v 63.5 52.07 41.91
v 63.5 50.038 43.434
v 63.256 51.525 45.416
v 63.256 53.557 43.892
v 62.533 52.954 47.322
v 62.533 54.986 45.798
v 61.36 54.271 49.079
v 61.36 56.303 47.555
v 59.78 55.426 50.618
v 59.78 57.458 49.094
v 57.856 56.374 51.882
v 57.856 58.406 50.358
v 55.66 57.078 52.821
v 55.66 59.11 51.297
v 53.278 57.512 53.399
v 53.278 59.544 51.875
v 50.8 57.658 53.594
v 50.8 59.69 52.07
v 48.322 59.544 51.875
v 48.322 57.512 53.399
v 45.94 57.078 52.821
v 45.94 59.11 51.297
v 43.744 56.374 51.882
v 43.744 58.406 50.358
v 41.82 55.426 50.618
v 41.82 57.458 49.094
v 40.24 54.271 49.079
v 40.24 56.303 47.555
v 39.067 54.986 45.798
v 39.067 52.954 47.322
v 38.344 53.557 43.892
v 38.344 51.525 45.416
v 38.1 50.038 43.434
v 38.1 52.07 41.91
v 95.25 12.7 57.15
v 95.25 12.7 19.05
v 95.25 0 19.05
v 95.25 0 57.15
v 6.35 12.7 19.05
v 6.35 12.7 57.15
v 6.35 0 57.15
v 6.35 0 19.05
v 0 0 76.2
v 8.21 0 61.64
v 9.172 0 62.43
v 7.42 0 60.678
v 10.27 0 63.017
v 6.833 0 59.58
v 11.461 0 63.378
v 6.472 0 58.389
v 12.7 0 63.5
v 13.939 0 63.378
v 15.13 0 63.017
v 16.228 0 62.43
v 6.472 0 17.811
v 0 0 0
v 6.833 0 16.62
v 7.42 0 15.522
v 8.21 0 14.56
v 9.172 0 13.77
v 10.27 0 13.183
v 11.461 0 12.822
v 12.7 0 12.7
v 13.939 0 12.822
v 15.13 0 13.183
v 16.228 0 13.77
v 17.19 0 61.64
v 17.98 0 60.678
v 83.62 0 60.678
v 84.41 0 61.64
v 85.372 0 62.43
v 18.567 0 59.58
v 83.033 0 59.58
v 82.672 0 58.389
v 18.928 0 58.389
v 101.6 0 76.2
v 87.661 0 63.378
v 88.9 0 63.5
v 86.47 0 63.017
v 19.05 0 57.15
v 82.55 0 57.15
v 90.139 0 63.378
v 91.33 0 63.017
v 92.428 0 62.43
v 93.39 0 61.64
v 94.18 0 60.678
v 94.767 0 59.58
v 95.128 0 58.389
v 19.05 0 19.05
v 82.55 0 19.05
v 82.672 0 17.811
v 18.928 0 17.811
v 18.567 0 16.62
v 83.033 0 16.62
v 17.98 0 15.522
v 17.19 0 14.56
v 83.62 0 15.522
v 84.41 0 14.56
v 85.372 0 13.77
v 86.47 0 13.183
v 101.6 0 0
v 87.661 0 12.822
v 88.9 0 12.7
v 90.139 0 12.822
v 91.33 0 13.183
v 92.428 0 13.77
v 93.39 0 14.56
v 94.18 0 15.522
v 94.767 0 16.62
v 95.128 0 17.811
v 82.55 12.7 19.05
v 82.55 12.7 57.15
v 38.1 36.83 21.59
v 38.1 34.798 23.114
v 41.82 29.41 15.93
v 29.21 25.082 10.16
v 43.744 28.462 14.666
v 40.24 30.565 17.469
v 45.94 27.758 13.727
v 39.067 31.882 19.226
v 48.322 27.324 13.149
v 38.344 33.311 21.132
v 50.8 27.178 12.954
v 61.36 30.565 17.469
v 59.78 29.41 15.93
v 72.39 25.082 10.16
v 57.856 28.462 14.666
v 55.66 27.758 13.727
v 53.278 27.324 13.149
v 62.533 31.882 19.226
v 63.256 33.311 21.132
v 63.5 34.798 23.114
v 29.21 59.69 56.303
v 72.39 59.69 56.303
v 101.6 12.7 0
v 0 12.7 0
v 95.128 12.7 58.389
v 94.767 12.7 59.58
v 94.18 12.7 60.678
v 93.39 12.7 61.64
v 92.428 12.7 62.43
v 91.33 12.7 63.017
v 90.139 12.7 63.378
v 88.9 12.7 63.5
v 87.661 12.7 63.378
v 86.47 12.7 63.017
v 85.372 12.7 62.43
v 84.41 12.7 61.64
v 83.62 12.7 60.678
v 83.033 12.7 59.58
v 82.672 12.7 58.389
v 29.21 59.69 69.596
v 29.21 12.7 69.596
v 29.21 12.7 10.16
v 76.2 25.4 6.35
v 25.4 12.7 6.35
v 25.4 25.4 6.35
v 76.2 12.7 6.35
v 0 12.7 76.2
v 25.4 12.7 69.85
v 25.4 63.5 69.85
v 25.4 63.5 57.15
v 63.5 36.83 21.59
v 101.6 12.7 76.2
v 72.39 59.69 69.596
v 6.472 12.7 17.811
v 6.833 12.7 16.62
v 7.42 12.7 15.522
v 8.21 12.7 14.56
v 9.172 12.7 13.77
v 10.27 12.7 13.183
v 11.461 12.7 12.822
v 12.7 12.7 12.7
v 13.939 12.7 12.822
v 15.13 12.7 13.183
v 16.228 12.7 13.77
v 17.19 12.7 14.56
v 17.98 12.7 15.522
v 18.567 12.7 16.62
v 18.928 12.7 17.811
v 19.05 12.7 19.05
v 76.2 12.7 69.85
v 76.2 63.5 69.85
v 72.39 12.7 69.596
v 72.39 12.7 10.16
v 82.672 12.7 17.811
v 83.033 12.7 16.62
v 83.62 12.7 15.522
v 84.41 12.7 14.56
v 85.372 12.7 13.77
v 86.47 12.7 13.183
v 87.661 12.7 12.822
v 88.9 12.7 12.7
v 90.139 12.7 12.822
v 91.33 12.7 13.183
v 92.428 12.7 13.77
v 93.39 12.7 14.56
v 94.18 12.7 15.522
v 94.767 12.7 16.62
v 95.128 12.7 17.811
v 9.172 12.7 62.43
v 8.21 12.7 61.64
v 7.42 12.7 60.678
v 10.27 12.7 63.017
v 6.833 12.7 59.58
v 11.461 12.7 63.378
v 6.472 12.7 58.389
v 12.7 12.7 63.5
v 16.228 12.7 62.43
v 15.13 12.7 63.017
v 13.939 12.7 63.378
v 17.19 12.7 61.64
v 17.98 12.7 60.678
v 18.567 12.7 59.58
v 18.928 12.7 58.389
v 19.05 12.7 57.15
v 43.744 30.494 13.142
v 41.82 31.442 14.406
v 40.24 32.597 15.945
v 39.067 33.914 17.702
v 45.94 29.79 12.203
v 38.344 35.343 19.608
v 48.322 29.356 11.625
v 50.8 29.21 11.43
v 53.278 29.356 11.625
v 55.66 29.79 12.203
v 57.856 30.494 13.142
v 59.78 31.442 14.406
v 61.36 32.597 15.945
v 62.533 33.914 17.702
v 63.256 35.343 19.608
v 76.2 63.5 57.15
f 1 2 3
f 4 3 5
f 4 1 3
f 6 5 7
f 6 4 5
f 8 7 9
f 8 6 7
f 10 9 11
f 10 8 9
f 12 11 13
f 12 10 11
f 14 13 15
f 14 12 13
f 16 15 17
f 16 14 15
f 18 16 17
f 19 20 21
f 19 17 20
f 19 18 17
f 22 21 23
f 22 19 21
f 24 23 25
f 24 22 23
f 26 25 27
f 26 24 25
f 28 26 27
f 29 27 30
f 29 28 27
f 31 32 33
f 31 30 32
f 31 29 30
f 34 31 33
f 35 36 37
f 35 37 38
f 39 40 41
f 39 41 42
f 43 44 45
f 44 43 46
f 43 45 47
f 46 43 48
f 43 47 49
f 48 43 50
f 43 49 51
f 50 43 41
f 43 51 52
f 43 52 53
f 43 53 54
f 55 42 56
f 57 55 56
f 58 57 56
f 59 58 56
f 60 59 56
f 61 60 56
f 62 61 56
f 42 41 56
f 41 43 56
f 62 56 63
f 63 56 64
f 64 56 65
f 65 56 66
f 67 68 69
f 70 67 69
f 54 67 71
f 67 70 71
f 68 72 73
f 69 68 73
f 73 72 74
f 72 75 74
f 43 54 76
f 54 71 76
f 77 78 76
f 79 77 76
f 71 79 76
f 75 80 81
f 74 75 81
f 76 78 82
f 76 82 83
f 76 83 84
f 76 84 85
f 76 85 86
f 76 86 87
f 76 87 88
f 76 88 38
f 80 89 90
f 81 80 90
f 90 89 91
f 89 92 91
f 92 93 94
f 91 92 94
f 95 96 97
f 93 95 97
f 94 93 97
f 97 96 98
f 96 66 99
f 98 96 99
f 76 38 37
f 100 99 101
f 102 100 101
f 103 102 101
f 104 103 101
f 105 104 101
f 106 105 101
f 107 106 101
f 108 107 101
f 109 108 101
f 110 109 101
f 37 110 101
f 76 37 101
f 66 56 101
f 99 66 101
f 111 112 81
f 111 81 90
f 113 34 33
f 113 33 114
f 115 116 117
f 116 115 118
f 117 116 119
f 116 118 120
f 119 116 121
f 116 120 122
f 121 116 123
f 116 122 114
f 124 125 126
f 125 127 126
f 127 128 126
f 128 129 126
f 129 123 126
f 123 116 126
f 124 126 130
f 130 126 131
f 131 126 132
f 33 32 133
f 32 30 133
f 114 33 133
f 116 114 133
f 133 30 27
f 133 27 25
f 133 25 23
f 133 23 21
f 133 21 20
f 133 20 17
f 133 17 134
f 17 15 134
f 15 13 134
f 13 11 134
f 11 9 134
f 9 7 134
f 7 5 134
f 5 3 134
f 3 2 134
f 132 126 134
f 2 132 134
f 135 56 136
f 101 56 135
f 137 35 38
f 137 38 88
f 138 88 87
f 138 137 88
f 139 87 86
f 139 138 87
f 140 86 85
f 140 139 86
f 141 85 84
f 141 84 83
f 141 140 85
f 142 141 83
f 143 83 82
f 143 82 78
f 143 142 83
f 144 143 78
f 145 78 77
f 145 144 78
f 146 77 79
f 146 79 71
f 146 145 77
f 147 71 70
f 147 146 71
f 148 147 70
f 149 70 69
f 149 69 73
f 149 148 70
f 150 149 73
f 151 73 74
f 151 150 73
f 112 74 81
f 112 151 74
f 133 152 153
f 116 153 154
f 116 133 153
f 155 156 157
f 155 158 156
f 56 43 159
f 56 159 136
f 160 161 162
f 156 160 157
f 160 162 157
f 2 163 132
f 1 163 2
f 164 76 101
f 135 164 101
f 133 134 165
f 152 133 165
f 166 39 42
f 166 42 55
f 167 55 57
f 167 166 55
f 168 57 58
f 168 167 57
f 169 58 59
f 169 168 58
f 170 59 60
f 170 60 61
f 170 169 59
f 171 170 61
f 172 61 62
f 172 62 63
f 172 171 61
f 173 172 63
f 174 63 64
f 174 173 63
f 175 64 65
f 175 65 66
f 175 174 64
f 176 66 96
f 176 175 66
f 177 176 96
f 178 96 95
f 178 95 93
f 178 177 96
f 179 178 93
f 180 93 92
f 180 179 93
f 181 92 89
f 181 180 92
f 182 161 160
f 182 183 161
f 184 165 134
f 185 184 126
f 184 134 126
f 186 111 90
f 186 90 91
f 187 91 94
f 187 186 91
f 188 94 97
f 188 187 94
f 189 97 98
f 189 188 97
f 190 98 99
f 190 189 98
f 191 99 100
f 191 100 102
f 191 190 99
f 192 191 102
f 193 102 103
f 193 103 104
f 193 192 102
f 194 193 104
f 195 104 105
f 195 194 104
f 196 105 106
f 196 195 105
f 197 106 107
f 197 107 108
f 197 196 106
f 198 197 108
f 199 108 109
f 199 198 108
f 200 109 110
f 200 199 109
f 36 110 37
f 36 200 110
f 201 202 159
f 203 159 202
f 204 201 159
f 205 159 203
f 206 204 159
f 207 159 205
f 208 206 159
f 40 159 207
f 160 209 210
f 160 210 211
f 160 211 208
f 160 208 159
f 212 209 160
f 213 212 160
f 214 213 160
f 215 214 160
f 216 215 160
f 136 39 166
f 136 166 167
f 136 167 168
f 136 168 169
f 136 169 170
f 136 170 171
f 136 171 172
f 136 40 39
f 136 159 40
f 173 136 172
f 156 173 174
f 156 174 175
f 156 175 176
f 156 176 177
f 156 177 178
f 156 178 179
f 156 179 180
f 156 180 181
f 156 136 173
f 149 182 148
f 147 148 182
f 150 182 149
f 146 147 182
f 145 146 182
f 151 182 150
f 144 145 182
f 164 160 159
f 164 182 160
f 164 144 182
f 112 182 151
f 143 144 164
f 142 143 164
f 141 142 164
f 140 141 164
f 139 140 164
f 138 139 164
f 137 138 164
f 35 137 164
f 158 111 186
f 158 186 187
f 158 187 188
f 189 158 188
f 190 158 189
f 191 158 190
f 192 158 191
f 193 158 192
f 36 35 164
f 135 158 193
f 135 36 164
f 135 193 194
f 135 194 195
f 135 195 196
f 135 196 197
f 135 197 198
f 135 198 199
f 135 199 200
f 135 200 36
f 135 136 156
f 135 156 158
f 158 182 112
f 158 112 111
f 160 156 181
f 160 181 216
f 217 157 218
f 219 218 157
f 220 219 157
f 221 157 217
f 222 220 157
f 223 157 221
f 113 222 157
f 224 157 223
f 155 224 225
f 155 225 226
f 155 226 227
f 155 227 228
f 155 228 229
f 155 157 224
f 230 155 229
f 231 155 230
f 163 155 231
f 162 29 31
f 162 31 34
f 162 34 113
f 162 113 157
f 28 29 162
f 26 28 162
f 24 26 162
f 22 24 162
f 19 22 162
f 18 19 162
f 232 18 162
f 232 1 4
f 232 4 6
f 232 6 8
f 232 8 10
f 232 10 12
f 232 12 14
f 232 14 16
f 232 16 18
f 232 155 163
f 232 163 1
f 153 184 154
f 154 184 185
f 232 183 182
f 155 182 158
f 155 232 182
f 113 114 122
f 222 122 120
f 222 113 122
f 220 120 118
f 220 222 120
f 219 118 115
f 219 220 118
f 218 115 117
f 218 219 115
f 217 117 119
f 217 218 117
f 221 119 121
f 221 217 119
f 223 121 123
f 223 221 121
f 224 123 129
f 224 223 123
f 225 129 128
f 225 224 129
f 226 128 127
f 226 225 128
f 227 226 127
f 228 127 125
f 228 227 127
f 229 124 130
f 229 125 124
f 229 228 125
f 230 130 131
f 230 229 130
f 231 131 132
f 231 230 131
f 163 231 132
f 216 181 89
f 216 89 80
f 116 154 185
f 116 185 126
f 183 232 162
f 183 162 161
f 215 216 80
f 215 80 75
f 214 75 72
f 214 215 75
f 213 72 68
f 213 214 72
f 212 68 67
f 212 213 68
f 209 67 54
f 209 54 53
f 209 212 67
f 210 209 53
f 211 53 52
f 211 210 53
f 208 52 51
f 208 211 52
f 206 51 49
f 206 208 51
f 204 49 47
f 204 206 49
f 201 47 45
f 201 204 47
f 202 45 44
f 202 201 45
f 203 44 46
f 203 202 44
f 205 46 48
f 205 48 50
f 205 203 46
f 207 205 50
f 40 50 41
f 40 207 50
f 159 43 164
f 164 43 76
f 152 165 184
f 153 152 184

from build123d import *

# Parameters (mm, degrees)
SKETCH1_W           = 101.6
SKETCH1_H           = 76.2
BOSS_EXTRUDE1_DEPTH = 12.7
CUT_EXTRUDE1_DEPTH  = 12.7
BOSS_EXTRUDE2_DEPTH = 25.4
CUT_EXTRUDE3_DEPTH  = 12.7
CUT_EXTRUDE7_DEPTH  = 21.59


with BuildPart() as part:
    # Sketch1 → Boss-Extrude1 (new body)
    with BuildSketch(Plane(origin=(0, 0, 0), x_dir=(1, 0, 0), z_dir=(0, 1, 0))):
        with Locations((50.8, -38.1)):
            Rectangle(SKETCH1_W, SKETCH1_H)
    extrude(amount=BOSS_EXTRUDE1_DEPTH)

    # Sketch4 → Cut-Extrude1 (cut)
    with BuildSketch(Plane(origin=(0, 12.7, 0), x_dir=(1, 0, 0), z_dir=(0, 1, 0))):
        with BuildLine():
            Line((19.05, -19.05), (19.05, -57.15))
            ThreePointArc((19.05, -57.15), (12.7, -63.5), (6.35, -57.15))
            Line((6.35, -57.15), (6.35, -19.05))
            ThreePointArc((6.35, -19.05), (12.7, -12.7), (19.05, -19.05))
        make_face()
        with BuildLine():
            Line((95.25, -19.05), (95.25, -57.15))
            ThreePointArc((95.25, -57.15), (88.9, -63.5), (82.55, -57.15))
            Line((82.55, -57.15), (82.55, -19.05))
            ThreePointArc((82.55, -19.05), (88.9, -12.7), (95.25, -19.05))
        make_face()
    extrude(amount=-CUT_EXTRUDE1_DEPTH, mode=Mode.SUBTRACT)

    # Sketch5 → Boss-Extrude2 (add, symmetric)
    with BuildSketch(Plane(origin=(50.8, 0, 0), x_dir=(0, 0, -1), z_dir=(1, 0, 0))):
        Polygon((-6.35, 12.7), (-6.35, 25.4), (-57.15, 63.5), (-69.85, 63.5), (-69.85, 12.7), align=None)
    extrude(amount=BOSS_EXTRUDE2_DEPTH, both=True)

    # Sketch10 → Cut-Extrude3 (cut)
    with BuildSketch(Plane(origin=(0, 13.208, -9.906), x_dir=(1, 0, 0), z_dir=(0, 0.8, -0.5999999999999999))):
        with BuildLine():
            Line((63.5, -39.37), (63.5, -64.77))
            ThreePointArc((63.5, -64.77), (50.8, -77.47), (38.1, -64.77))
            Line((38.1, -64.77), (38.1, -39.37))
            ThreePointArc((38.1, -39.37), (50.8, -26.67), (63.5, -39.37))
        make_face()
    extrude(amount=-CUT_EXTRUDE3_DEPTH, mode=Mode.SUBTRACT)

    # Sketch12 → Cut-Extrude7 (cut, symmetric)
    with BuildSketch(Plane(origin=(50.8, 0, 0), x_dir=(0, 0, -1), z_dir=(1, 0, 0))):
        Polygon((-10.16, 25.0825), (-56.303333333, 59.69), (-69.596, 59.69), (-69.596, 12.7), (-10.16, 12.7), align=None)
    extrude(amount=CUT_EXTRUDE7_DEPTH, both=True, mode=Mode.SUBTRACT)


solid = part.part
